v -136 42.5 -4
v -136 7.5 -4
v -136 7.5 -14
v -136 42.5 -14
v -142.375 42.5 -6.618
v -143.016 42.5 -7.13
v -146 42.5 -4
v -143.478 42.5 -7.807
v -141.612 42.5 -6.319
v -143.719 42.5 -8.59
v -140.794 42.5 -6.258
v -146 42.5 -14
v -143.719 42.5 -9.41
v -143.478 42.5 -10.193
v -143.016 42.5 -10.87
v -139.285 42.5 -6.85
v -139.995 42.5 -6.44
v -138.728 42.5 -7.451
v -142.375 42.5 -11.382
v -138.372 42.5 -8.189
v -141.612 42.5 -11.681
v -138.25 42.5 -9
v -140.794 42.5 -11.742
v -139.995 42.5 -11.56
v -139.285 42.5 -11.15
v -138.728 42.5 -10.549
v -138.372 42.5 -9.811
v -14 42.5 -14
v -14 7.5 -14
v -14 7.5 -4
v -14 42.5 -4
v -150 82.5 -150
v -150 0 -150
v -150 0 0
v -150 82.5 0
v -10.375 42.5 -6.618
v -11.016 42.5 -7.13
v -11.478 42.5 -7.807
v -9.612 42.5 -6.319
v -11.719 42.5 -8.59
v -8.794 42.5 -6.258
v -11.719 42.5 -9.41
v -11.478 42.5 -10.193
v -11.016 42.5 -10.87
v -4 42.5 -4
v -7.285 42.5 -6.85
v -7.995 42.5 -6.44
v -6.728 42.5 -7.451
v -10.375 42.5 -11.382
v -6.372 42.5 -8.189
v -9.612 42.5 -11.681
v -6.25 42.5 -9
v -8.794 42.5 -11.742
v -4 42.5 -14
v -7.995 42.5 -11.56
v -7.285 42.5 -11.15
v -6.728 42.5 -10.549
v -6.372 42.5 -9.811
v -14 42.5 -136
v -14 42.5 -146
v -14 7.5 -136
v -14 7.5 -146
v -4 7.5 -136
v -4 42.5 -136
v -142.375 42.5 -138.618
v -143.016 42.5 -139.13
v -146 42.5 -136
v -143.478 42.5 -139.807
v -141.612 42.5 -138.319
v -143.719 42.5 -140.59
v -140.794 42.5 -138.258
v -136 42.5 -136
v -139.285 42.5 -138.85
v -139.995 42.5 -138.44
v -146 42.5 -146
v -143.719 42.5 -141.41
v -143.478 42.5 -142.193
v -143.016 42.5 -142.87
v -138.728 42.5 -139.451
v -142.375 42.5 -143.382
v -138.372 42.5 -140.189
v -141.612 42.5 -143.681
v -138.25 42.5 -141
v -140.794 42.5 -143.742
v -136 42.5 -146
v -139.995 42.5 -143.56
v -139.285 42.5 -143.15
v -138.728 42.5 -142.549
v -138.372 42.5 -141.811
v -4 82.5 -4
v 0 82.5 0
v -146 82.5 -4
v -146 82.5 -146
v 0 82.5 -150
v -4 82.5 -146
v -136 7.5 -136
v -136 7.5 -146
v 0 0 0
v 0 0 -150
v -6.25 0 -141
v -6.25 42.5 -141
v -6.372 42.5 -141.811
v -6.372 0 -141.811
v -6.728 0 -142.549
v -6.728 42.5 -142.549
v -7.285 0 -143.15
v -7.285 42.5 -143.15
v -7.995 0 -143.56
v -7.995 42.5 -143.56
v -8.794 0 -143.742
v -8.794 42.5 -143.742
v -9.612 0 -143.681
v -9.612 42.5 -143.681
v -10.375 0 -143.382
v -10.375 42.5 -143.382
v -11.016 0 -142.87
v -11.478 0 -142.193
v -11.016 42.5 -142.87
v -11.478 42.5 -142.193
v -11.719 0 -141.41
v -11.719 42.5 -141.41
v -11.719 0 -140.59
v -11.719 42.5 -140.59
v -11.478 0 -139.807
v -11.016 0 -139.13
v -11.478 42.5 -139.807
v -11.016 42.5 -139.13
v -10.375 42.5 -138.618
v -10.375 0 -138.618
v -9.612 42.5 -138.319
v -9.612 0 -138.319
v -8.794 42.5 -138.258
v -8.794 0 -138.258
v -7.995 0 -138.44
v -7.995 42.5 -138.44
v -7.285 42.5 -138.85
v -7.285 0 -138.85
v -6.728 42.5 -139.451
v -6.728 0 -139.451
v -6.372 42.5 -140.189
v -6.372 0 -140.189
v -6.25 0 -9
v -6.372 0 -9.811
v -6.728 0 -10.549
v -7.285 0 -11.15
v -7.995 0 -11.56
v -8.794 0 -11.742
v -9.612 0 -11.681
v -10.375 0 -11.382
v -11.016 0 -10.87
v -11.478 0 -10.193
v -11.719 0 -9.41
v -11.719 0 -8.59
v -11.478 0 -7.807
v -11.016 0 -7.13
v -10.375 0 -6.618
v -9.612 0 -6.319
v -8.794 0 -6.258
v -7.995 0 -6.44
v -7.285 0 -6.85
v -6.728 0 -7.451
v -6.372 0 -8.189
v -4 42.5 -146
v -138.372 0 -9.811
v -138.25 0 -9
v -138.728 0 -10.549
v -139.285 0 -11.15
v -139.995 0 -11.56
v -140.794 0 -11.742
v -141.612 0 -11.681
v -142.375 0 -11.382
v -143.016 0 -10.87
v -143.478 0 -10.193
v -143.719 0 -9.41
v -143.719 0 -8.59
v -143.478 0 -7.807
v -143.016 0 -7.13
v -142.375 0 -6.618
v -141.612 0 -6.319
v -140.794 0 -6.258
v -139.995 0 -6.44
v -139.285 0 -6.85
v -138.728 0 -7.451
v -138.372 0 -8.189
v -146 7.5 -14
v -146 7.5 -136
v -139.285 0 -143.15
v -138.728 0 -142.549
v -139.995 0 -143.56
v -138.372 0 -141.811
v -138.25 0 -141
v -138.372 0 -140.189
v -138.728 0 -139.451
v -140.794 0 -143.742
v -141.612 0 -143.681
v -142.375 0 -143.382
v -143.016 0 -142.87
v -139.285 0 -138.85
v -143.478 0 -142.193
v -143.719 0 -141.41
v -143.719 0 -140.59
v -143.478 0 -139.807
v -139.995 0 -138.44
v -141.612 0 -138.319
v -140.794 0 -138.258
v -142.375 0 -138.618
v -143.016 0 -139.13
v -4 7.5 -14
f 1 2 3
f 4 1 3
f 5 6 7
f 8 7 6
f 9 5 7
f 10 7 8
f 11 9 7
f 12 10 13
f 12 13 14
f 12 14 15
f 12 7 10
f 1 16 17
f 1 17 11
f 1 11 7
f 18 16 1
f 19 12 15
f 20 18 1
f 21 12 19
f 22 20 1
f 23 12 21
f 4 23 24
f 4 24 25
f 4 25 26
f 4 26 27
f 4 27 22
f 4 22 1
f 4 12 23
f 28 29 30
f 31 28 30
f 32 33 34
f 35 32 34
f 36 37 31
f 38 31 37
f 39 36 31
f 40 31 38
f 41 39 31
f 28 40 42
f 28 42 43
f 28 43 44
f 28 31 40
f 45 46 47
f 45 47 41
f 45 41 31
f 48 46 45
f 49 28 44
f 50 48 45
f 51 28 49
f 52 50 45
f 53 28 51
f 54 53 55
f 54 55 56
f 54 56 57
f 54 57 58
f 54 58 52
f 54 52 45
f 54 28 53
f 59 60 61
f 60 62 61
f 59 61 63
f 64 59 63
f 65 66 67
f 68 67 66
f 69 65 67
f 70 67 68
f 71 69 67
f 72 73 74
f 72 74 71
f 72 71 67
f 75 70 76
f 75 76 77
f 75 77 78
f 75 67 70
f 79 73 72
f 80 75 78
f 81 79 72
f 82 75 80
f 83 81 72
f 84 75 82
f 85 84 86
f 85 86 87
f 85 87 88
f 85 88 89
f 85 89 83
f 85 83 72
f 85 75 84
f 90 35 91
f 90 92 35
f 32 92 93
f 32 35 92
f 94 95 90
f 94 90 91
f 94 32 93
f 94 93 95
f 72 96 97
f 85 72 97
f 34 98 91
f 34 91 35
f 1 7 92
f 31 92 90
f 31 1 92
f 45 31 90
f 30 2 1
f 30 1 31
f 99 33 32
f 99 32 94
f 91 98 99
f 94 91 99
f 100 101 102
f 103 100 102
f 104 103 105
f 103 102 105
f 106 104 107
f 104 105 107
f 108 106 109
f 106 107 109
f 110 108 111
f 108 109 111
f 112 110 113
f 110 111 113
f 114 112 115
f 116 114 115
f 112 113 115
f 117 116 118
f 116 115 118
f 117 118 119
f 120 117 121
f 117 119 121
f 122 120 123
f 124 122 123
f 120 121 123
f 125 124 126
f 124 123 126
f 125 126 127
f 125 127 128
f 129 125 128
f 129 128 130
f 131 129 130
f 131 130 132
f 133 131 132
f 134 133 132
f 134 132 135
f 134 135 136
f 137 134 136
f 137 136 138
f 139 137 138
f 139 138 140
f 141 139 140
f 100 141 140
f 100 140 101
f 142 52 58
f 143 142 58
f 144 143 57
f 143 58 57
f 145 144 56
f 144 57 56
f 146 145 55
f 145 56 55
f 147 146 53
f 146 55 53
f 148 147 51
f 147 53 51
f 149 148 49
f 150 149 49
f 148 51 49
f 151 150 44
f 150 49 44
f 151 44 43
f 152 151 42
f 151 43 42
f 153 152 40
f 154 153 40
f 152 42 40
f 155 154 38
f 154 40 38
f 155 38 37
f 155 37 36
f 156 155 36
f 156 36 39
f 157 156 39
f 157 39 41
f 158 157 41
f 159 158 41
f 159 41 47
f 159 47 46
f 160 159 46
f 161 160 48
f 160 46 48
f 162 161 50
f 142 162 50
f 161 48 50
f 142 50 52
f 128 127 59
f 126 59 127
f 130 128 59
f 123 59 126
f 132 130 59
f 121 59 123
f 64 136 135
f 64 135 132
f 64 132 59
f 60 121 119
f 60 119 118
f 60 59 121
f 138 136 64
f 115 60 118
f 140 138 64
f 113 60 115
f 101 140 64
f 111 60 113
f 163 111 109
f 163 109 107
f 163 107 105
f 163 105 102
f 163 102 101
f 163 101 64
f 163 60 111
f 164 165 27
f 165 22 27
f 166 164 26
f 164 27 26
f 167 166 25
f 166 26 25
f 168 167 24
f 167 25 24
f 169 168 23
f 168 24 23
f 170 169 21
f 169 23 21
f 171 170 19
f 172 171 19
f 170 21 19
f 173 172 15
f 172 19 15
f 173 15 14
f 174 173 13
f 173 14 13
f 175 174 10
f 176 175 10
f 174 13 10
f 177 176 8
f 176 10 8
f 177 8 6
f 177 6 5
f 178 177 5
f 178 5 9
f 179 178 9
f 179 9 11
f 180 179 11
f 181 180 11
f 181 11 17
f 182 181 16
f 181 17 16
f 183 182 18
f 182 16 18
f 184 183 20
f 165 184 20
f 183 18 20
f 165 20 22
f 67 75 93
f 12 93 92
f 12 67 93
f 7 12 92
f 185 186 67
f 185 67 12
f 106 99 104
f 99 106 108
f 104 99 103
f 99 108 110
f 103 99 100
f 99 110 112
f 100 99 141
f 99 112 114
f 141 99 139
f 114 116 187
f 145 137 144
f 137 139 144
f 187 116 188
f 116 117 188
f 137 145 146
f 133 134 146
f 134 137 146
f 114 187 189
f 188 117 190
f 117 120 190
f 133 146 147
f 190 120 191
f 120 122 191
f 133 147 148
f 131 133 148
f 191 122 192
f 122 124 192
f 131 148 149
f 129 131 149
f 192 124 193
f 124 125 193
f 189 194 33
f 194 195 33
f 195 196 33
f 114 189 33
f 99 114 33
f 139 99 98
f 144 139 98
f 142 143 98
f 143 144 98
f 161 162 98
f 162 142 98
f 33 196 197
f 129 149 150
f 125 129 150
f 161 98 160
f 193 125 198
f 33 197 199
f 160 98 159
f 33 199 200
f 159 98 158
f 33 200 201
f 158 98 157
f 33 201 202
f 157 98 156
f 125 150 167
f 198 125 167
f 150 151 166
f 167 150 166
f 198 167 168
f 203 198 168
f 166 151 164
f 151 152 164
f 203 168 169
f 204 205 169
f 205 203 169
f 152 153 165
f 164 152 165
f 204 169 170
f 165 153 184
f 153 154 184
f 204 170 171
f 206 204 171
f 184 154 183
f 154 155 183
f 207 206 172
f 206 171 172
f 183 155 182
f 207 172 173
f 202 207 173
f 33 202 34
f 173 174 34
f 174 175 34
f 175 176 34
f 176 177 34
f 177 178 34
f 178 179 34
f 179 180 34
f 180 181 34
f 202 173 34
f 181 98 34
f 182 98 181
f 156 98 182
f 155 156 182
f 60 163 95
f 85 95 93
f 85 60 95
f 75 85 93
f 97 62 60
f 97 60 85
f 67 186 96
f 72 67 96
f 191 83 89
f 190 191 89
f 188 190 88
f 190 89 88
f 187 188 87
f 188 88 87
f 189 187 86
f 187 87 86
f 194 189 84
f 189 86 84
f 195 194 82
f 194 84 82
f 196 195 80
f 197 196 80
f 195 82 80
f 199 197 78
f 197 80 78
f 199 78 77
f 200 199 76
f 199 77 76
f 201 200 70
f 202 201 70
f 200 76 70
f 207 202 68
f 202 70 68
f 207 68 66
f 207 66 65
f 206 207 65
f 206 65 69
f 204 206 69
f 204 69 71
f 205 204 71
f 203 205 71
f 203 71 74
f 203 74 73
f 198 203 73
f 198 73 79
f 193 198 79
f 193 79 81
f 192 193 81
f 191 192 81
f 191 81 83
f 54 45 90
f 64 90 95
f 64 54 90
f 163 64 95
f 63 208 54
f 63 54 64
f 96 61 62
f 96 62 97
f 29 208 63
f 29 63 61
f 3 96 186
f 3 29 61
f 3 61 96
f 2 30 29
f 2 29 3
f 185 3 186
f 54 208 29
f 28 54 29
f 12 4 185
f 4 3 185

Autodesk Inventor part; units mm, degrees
ref_plane "YZ Plane" through (0, 0, 0) normal (1, 0, 0) x (0, 1, 0)
ref_plane "XZ Plane" through (0, 0, 0) normal (0, 1, 0) x (-1, 0, 0)
ref_plane "XY Plane" through (0, 0, 0) normal (0, 0, 1) x (1, 0, 0)
sketch "Sketch1" plane through (0, 0, 0) normal (0, 1, 0) x (-1, 0, 0)
  point P0 (0, 0)
sketch "Sketch2" plane through (0, 0, 0) normal (0, 1, 0) x (-1, 0, 0)
  line L0 (0, 0) -> (150, 0)
  line L1 (150, 0) -> (150, -150)
  line L2 (150, -150) -> (0, -150)
  line L3 (0, -150) -> (0, 0)
  dimension "d0" = 150
  dimension "d1" = 150
extrude "Extrusion1" add sketch "Sketch2" along normal blind 7.5
sketch "Sketch4" plane through (0, 7.5, 0) normal (0, 1, 0) x (1, 0, 0)
  line L0 (0, 0) -> (-150, 0) projected
  line L1 (0, 150) -> (0, 0) projected
  line L2 (-150, 0) -> (0, 0)
  line L3 (0, 0) -> (0, 150)
  line L4 (0, 150) -> (-150, 150)
  line L5 (-150, 150) -> (-150, 0)
  line L6 (-146, 4) -> (-4, 4)
  line L7 (-4, 4) -> (-4, 146)
  line L8 (-4, 146) -> (-146, 146)
  line L9 (-146, 146) -> (-146, 4)
  dimension "d7" = 4
extrude "Extrusion3" add sketch "Sketch4" along normal blind 35
sketch "Sketch5" plane through (0, 7.5, 0) normal (0, 1, 0) x (1, 0, 0)
  line L0 (-146, 146) -> (-146, 4) projected
  line L1 (-146, 4) -> (-136, 4)
  line L2 (-136, 4) -> (-136, 14)
  line L3 (-136, 14) -> (-146, 14)
  line L4 (-146, 14) -> (-146, 4)
  point P0 (0, 0)
  dimension "d10" = 10
  dimension "d11" = 10
extrude "Extrusion4" add sketch "Sketch5" along normal blind 35
pattern_linear "Rectangular Pattern1" count 2 spacing 132 along (0, 0, -1) count 2 spacing 132 along (1, 0, 0) of "Extrusion4"
sketch "Sketch6" plane through (0, 42.5, 0) normal (0, 1, 0) x (1, 0, 0)
  line L0 (-136, 14) -> (-146, 14) projected
  line L1 (-141, 14) -> (-141, 0)
  line L2 (0, 0) -> (-150, 0) projected
  circle A0 centre (-141, 9) radius 2.75
  dimension "d20" = 5.5
extrude "Extrusion5" cut sketch "Sketch6" against normal blind 80
pattern_linear "Rectangular Pattern2" count 2 spacing 132 along (0, 0, -1) count 2 spacing 132 along (1, 0, 0) of "Extrusion5"
sketch "Sketch9" plane through (0, 42.5, 0) normal (0, 1, 0) x (1, 0, 0)
  point P0 (0, 0)
sketch "Sketch10" plane through (0, 42.5, 0) normal (0, 1, 0) x (1, 0, 0)
  line L0 (-150, 150) -> (0, 150) projected
  line L1 (0, 0) -> (-150, 0) projected
  line L2 (0, 150) -> (-150, 150)
  line L3 (-150, 150) -> (-150, 0)
  line L4 (-150, 0) -> (0, 0)
  line L5 (0, 0) -> (0, 150)
  line L6 (-4, 146) -> (-146, 146)
  line L7 (-146, 146) -> (-146, 4)
  line L8 (-146, 4) -> (-4, 4)
  line L9 (-4, 4) -> (-4, 146)
  dimension "d45" = 4
extrude "Extrusion8" add sketch "Sketch10" along normal blind 40
sketch "Sketch11" plane through (0, 7.5, 0) normal (0, 1, 0) x (1, 0, 0)
  point P0 (0, 0)
properties part number "Bottom1"
